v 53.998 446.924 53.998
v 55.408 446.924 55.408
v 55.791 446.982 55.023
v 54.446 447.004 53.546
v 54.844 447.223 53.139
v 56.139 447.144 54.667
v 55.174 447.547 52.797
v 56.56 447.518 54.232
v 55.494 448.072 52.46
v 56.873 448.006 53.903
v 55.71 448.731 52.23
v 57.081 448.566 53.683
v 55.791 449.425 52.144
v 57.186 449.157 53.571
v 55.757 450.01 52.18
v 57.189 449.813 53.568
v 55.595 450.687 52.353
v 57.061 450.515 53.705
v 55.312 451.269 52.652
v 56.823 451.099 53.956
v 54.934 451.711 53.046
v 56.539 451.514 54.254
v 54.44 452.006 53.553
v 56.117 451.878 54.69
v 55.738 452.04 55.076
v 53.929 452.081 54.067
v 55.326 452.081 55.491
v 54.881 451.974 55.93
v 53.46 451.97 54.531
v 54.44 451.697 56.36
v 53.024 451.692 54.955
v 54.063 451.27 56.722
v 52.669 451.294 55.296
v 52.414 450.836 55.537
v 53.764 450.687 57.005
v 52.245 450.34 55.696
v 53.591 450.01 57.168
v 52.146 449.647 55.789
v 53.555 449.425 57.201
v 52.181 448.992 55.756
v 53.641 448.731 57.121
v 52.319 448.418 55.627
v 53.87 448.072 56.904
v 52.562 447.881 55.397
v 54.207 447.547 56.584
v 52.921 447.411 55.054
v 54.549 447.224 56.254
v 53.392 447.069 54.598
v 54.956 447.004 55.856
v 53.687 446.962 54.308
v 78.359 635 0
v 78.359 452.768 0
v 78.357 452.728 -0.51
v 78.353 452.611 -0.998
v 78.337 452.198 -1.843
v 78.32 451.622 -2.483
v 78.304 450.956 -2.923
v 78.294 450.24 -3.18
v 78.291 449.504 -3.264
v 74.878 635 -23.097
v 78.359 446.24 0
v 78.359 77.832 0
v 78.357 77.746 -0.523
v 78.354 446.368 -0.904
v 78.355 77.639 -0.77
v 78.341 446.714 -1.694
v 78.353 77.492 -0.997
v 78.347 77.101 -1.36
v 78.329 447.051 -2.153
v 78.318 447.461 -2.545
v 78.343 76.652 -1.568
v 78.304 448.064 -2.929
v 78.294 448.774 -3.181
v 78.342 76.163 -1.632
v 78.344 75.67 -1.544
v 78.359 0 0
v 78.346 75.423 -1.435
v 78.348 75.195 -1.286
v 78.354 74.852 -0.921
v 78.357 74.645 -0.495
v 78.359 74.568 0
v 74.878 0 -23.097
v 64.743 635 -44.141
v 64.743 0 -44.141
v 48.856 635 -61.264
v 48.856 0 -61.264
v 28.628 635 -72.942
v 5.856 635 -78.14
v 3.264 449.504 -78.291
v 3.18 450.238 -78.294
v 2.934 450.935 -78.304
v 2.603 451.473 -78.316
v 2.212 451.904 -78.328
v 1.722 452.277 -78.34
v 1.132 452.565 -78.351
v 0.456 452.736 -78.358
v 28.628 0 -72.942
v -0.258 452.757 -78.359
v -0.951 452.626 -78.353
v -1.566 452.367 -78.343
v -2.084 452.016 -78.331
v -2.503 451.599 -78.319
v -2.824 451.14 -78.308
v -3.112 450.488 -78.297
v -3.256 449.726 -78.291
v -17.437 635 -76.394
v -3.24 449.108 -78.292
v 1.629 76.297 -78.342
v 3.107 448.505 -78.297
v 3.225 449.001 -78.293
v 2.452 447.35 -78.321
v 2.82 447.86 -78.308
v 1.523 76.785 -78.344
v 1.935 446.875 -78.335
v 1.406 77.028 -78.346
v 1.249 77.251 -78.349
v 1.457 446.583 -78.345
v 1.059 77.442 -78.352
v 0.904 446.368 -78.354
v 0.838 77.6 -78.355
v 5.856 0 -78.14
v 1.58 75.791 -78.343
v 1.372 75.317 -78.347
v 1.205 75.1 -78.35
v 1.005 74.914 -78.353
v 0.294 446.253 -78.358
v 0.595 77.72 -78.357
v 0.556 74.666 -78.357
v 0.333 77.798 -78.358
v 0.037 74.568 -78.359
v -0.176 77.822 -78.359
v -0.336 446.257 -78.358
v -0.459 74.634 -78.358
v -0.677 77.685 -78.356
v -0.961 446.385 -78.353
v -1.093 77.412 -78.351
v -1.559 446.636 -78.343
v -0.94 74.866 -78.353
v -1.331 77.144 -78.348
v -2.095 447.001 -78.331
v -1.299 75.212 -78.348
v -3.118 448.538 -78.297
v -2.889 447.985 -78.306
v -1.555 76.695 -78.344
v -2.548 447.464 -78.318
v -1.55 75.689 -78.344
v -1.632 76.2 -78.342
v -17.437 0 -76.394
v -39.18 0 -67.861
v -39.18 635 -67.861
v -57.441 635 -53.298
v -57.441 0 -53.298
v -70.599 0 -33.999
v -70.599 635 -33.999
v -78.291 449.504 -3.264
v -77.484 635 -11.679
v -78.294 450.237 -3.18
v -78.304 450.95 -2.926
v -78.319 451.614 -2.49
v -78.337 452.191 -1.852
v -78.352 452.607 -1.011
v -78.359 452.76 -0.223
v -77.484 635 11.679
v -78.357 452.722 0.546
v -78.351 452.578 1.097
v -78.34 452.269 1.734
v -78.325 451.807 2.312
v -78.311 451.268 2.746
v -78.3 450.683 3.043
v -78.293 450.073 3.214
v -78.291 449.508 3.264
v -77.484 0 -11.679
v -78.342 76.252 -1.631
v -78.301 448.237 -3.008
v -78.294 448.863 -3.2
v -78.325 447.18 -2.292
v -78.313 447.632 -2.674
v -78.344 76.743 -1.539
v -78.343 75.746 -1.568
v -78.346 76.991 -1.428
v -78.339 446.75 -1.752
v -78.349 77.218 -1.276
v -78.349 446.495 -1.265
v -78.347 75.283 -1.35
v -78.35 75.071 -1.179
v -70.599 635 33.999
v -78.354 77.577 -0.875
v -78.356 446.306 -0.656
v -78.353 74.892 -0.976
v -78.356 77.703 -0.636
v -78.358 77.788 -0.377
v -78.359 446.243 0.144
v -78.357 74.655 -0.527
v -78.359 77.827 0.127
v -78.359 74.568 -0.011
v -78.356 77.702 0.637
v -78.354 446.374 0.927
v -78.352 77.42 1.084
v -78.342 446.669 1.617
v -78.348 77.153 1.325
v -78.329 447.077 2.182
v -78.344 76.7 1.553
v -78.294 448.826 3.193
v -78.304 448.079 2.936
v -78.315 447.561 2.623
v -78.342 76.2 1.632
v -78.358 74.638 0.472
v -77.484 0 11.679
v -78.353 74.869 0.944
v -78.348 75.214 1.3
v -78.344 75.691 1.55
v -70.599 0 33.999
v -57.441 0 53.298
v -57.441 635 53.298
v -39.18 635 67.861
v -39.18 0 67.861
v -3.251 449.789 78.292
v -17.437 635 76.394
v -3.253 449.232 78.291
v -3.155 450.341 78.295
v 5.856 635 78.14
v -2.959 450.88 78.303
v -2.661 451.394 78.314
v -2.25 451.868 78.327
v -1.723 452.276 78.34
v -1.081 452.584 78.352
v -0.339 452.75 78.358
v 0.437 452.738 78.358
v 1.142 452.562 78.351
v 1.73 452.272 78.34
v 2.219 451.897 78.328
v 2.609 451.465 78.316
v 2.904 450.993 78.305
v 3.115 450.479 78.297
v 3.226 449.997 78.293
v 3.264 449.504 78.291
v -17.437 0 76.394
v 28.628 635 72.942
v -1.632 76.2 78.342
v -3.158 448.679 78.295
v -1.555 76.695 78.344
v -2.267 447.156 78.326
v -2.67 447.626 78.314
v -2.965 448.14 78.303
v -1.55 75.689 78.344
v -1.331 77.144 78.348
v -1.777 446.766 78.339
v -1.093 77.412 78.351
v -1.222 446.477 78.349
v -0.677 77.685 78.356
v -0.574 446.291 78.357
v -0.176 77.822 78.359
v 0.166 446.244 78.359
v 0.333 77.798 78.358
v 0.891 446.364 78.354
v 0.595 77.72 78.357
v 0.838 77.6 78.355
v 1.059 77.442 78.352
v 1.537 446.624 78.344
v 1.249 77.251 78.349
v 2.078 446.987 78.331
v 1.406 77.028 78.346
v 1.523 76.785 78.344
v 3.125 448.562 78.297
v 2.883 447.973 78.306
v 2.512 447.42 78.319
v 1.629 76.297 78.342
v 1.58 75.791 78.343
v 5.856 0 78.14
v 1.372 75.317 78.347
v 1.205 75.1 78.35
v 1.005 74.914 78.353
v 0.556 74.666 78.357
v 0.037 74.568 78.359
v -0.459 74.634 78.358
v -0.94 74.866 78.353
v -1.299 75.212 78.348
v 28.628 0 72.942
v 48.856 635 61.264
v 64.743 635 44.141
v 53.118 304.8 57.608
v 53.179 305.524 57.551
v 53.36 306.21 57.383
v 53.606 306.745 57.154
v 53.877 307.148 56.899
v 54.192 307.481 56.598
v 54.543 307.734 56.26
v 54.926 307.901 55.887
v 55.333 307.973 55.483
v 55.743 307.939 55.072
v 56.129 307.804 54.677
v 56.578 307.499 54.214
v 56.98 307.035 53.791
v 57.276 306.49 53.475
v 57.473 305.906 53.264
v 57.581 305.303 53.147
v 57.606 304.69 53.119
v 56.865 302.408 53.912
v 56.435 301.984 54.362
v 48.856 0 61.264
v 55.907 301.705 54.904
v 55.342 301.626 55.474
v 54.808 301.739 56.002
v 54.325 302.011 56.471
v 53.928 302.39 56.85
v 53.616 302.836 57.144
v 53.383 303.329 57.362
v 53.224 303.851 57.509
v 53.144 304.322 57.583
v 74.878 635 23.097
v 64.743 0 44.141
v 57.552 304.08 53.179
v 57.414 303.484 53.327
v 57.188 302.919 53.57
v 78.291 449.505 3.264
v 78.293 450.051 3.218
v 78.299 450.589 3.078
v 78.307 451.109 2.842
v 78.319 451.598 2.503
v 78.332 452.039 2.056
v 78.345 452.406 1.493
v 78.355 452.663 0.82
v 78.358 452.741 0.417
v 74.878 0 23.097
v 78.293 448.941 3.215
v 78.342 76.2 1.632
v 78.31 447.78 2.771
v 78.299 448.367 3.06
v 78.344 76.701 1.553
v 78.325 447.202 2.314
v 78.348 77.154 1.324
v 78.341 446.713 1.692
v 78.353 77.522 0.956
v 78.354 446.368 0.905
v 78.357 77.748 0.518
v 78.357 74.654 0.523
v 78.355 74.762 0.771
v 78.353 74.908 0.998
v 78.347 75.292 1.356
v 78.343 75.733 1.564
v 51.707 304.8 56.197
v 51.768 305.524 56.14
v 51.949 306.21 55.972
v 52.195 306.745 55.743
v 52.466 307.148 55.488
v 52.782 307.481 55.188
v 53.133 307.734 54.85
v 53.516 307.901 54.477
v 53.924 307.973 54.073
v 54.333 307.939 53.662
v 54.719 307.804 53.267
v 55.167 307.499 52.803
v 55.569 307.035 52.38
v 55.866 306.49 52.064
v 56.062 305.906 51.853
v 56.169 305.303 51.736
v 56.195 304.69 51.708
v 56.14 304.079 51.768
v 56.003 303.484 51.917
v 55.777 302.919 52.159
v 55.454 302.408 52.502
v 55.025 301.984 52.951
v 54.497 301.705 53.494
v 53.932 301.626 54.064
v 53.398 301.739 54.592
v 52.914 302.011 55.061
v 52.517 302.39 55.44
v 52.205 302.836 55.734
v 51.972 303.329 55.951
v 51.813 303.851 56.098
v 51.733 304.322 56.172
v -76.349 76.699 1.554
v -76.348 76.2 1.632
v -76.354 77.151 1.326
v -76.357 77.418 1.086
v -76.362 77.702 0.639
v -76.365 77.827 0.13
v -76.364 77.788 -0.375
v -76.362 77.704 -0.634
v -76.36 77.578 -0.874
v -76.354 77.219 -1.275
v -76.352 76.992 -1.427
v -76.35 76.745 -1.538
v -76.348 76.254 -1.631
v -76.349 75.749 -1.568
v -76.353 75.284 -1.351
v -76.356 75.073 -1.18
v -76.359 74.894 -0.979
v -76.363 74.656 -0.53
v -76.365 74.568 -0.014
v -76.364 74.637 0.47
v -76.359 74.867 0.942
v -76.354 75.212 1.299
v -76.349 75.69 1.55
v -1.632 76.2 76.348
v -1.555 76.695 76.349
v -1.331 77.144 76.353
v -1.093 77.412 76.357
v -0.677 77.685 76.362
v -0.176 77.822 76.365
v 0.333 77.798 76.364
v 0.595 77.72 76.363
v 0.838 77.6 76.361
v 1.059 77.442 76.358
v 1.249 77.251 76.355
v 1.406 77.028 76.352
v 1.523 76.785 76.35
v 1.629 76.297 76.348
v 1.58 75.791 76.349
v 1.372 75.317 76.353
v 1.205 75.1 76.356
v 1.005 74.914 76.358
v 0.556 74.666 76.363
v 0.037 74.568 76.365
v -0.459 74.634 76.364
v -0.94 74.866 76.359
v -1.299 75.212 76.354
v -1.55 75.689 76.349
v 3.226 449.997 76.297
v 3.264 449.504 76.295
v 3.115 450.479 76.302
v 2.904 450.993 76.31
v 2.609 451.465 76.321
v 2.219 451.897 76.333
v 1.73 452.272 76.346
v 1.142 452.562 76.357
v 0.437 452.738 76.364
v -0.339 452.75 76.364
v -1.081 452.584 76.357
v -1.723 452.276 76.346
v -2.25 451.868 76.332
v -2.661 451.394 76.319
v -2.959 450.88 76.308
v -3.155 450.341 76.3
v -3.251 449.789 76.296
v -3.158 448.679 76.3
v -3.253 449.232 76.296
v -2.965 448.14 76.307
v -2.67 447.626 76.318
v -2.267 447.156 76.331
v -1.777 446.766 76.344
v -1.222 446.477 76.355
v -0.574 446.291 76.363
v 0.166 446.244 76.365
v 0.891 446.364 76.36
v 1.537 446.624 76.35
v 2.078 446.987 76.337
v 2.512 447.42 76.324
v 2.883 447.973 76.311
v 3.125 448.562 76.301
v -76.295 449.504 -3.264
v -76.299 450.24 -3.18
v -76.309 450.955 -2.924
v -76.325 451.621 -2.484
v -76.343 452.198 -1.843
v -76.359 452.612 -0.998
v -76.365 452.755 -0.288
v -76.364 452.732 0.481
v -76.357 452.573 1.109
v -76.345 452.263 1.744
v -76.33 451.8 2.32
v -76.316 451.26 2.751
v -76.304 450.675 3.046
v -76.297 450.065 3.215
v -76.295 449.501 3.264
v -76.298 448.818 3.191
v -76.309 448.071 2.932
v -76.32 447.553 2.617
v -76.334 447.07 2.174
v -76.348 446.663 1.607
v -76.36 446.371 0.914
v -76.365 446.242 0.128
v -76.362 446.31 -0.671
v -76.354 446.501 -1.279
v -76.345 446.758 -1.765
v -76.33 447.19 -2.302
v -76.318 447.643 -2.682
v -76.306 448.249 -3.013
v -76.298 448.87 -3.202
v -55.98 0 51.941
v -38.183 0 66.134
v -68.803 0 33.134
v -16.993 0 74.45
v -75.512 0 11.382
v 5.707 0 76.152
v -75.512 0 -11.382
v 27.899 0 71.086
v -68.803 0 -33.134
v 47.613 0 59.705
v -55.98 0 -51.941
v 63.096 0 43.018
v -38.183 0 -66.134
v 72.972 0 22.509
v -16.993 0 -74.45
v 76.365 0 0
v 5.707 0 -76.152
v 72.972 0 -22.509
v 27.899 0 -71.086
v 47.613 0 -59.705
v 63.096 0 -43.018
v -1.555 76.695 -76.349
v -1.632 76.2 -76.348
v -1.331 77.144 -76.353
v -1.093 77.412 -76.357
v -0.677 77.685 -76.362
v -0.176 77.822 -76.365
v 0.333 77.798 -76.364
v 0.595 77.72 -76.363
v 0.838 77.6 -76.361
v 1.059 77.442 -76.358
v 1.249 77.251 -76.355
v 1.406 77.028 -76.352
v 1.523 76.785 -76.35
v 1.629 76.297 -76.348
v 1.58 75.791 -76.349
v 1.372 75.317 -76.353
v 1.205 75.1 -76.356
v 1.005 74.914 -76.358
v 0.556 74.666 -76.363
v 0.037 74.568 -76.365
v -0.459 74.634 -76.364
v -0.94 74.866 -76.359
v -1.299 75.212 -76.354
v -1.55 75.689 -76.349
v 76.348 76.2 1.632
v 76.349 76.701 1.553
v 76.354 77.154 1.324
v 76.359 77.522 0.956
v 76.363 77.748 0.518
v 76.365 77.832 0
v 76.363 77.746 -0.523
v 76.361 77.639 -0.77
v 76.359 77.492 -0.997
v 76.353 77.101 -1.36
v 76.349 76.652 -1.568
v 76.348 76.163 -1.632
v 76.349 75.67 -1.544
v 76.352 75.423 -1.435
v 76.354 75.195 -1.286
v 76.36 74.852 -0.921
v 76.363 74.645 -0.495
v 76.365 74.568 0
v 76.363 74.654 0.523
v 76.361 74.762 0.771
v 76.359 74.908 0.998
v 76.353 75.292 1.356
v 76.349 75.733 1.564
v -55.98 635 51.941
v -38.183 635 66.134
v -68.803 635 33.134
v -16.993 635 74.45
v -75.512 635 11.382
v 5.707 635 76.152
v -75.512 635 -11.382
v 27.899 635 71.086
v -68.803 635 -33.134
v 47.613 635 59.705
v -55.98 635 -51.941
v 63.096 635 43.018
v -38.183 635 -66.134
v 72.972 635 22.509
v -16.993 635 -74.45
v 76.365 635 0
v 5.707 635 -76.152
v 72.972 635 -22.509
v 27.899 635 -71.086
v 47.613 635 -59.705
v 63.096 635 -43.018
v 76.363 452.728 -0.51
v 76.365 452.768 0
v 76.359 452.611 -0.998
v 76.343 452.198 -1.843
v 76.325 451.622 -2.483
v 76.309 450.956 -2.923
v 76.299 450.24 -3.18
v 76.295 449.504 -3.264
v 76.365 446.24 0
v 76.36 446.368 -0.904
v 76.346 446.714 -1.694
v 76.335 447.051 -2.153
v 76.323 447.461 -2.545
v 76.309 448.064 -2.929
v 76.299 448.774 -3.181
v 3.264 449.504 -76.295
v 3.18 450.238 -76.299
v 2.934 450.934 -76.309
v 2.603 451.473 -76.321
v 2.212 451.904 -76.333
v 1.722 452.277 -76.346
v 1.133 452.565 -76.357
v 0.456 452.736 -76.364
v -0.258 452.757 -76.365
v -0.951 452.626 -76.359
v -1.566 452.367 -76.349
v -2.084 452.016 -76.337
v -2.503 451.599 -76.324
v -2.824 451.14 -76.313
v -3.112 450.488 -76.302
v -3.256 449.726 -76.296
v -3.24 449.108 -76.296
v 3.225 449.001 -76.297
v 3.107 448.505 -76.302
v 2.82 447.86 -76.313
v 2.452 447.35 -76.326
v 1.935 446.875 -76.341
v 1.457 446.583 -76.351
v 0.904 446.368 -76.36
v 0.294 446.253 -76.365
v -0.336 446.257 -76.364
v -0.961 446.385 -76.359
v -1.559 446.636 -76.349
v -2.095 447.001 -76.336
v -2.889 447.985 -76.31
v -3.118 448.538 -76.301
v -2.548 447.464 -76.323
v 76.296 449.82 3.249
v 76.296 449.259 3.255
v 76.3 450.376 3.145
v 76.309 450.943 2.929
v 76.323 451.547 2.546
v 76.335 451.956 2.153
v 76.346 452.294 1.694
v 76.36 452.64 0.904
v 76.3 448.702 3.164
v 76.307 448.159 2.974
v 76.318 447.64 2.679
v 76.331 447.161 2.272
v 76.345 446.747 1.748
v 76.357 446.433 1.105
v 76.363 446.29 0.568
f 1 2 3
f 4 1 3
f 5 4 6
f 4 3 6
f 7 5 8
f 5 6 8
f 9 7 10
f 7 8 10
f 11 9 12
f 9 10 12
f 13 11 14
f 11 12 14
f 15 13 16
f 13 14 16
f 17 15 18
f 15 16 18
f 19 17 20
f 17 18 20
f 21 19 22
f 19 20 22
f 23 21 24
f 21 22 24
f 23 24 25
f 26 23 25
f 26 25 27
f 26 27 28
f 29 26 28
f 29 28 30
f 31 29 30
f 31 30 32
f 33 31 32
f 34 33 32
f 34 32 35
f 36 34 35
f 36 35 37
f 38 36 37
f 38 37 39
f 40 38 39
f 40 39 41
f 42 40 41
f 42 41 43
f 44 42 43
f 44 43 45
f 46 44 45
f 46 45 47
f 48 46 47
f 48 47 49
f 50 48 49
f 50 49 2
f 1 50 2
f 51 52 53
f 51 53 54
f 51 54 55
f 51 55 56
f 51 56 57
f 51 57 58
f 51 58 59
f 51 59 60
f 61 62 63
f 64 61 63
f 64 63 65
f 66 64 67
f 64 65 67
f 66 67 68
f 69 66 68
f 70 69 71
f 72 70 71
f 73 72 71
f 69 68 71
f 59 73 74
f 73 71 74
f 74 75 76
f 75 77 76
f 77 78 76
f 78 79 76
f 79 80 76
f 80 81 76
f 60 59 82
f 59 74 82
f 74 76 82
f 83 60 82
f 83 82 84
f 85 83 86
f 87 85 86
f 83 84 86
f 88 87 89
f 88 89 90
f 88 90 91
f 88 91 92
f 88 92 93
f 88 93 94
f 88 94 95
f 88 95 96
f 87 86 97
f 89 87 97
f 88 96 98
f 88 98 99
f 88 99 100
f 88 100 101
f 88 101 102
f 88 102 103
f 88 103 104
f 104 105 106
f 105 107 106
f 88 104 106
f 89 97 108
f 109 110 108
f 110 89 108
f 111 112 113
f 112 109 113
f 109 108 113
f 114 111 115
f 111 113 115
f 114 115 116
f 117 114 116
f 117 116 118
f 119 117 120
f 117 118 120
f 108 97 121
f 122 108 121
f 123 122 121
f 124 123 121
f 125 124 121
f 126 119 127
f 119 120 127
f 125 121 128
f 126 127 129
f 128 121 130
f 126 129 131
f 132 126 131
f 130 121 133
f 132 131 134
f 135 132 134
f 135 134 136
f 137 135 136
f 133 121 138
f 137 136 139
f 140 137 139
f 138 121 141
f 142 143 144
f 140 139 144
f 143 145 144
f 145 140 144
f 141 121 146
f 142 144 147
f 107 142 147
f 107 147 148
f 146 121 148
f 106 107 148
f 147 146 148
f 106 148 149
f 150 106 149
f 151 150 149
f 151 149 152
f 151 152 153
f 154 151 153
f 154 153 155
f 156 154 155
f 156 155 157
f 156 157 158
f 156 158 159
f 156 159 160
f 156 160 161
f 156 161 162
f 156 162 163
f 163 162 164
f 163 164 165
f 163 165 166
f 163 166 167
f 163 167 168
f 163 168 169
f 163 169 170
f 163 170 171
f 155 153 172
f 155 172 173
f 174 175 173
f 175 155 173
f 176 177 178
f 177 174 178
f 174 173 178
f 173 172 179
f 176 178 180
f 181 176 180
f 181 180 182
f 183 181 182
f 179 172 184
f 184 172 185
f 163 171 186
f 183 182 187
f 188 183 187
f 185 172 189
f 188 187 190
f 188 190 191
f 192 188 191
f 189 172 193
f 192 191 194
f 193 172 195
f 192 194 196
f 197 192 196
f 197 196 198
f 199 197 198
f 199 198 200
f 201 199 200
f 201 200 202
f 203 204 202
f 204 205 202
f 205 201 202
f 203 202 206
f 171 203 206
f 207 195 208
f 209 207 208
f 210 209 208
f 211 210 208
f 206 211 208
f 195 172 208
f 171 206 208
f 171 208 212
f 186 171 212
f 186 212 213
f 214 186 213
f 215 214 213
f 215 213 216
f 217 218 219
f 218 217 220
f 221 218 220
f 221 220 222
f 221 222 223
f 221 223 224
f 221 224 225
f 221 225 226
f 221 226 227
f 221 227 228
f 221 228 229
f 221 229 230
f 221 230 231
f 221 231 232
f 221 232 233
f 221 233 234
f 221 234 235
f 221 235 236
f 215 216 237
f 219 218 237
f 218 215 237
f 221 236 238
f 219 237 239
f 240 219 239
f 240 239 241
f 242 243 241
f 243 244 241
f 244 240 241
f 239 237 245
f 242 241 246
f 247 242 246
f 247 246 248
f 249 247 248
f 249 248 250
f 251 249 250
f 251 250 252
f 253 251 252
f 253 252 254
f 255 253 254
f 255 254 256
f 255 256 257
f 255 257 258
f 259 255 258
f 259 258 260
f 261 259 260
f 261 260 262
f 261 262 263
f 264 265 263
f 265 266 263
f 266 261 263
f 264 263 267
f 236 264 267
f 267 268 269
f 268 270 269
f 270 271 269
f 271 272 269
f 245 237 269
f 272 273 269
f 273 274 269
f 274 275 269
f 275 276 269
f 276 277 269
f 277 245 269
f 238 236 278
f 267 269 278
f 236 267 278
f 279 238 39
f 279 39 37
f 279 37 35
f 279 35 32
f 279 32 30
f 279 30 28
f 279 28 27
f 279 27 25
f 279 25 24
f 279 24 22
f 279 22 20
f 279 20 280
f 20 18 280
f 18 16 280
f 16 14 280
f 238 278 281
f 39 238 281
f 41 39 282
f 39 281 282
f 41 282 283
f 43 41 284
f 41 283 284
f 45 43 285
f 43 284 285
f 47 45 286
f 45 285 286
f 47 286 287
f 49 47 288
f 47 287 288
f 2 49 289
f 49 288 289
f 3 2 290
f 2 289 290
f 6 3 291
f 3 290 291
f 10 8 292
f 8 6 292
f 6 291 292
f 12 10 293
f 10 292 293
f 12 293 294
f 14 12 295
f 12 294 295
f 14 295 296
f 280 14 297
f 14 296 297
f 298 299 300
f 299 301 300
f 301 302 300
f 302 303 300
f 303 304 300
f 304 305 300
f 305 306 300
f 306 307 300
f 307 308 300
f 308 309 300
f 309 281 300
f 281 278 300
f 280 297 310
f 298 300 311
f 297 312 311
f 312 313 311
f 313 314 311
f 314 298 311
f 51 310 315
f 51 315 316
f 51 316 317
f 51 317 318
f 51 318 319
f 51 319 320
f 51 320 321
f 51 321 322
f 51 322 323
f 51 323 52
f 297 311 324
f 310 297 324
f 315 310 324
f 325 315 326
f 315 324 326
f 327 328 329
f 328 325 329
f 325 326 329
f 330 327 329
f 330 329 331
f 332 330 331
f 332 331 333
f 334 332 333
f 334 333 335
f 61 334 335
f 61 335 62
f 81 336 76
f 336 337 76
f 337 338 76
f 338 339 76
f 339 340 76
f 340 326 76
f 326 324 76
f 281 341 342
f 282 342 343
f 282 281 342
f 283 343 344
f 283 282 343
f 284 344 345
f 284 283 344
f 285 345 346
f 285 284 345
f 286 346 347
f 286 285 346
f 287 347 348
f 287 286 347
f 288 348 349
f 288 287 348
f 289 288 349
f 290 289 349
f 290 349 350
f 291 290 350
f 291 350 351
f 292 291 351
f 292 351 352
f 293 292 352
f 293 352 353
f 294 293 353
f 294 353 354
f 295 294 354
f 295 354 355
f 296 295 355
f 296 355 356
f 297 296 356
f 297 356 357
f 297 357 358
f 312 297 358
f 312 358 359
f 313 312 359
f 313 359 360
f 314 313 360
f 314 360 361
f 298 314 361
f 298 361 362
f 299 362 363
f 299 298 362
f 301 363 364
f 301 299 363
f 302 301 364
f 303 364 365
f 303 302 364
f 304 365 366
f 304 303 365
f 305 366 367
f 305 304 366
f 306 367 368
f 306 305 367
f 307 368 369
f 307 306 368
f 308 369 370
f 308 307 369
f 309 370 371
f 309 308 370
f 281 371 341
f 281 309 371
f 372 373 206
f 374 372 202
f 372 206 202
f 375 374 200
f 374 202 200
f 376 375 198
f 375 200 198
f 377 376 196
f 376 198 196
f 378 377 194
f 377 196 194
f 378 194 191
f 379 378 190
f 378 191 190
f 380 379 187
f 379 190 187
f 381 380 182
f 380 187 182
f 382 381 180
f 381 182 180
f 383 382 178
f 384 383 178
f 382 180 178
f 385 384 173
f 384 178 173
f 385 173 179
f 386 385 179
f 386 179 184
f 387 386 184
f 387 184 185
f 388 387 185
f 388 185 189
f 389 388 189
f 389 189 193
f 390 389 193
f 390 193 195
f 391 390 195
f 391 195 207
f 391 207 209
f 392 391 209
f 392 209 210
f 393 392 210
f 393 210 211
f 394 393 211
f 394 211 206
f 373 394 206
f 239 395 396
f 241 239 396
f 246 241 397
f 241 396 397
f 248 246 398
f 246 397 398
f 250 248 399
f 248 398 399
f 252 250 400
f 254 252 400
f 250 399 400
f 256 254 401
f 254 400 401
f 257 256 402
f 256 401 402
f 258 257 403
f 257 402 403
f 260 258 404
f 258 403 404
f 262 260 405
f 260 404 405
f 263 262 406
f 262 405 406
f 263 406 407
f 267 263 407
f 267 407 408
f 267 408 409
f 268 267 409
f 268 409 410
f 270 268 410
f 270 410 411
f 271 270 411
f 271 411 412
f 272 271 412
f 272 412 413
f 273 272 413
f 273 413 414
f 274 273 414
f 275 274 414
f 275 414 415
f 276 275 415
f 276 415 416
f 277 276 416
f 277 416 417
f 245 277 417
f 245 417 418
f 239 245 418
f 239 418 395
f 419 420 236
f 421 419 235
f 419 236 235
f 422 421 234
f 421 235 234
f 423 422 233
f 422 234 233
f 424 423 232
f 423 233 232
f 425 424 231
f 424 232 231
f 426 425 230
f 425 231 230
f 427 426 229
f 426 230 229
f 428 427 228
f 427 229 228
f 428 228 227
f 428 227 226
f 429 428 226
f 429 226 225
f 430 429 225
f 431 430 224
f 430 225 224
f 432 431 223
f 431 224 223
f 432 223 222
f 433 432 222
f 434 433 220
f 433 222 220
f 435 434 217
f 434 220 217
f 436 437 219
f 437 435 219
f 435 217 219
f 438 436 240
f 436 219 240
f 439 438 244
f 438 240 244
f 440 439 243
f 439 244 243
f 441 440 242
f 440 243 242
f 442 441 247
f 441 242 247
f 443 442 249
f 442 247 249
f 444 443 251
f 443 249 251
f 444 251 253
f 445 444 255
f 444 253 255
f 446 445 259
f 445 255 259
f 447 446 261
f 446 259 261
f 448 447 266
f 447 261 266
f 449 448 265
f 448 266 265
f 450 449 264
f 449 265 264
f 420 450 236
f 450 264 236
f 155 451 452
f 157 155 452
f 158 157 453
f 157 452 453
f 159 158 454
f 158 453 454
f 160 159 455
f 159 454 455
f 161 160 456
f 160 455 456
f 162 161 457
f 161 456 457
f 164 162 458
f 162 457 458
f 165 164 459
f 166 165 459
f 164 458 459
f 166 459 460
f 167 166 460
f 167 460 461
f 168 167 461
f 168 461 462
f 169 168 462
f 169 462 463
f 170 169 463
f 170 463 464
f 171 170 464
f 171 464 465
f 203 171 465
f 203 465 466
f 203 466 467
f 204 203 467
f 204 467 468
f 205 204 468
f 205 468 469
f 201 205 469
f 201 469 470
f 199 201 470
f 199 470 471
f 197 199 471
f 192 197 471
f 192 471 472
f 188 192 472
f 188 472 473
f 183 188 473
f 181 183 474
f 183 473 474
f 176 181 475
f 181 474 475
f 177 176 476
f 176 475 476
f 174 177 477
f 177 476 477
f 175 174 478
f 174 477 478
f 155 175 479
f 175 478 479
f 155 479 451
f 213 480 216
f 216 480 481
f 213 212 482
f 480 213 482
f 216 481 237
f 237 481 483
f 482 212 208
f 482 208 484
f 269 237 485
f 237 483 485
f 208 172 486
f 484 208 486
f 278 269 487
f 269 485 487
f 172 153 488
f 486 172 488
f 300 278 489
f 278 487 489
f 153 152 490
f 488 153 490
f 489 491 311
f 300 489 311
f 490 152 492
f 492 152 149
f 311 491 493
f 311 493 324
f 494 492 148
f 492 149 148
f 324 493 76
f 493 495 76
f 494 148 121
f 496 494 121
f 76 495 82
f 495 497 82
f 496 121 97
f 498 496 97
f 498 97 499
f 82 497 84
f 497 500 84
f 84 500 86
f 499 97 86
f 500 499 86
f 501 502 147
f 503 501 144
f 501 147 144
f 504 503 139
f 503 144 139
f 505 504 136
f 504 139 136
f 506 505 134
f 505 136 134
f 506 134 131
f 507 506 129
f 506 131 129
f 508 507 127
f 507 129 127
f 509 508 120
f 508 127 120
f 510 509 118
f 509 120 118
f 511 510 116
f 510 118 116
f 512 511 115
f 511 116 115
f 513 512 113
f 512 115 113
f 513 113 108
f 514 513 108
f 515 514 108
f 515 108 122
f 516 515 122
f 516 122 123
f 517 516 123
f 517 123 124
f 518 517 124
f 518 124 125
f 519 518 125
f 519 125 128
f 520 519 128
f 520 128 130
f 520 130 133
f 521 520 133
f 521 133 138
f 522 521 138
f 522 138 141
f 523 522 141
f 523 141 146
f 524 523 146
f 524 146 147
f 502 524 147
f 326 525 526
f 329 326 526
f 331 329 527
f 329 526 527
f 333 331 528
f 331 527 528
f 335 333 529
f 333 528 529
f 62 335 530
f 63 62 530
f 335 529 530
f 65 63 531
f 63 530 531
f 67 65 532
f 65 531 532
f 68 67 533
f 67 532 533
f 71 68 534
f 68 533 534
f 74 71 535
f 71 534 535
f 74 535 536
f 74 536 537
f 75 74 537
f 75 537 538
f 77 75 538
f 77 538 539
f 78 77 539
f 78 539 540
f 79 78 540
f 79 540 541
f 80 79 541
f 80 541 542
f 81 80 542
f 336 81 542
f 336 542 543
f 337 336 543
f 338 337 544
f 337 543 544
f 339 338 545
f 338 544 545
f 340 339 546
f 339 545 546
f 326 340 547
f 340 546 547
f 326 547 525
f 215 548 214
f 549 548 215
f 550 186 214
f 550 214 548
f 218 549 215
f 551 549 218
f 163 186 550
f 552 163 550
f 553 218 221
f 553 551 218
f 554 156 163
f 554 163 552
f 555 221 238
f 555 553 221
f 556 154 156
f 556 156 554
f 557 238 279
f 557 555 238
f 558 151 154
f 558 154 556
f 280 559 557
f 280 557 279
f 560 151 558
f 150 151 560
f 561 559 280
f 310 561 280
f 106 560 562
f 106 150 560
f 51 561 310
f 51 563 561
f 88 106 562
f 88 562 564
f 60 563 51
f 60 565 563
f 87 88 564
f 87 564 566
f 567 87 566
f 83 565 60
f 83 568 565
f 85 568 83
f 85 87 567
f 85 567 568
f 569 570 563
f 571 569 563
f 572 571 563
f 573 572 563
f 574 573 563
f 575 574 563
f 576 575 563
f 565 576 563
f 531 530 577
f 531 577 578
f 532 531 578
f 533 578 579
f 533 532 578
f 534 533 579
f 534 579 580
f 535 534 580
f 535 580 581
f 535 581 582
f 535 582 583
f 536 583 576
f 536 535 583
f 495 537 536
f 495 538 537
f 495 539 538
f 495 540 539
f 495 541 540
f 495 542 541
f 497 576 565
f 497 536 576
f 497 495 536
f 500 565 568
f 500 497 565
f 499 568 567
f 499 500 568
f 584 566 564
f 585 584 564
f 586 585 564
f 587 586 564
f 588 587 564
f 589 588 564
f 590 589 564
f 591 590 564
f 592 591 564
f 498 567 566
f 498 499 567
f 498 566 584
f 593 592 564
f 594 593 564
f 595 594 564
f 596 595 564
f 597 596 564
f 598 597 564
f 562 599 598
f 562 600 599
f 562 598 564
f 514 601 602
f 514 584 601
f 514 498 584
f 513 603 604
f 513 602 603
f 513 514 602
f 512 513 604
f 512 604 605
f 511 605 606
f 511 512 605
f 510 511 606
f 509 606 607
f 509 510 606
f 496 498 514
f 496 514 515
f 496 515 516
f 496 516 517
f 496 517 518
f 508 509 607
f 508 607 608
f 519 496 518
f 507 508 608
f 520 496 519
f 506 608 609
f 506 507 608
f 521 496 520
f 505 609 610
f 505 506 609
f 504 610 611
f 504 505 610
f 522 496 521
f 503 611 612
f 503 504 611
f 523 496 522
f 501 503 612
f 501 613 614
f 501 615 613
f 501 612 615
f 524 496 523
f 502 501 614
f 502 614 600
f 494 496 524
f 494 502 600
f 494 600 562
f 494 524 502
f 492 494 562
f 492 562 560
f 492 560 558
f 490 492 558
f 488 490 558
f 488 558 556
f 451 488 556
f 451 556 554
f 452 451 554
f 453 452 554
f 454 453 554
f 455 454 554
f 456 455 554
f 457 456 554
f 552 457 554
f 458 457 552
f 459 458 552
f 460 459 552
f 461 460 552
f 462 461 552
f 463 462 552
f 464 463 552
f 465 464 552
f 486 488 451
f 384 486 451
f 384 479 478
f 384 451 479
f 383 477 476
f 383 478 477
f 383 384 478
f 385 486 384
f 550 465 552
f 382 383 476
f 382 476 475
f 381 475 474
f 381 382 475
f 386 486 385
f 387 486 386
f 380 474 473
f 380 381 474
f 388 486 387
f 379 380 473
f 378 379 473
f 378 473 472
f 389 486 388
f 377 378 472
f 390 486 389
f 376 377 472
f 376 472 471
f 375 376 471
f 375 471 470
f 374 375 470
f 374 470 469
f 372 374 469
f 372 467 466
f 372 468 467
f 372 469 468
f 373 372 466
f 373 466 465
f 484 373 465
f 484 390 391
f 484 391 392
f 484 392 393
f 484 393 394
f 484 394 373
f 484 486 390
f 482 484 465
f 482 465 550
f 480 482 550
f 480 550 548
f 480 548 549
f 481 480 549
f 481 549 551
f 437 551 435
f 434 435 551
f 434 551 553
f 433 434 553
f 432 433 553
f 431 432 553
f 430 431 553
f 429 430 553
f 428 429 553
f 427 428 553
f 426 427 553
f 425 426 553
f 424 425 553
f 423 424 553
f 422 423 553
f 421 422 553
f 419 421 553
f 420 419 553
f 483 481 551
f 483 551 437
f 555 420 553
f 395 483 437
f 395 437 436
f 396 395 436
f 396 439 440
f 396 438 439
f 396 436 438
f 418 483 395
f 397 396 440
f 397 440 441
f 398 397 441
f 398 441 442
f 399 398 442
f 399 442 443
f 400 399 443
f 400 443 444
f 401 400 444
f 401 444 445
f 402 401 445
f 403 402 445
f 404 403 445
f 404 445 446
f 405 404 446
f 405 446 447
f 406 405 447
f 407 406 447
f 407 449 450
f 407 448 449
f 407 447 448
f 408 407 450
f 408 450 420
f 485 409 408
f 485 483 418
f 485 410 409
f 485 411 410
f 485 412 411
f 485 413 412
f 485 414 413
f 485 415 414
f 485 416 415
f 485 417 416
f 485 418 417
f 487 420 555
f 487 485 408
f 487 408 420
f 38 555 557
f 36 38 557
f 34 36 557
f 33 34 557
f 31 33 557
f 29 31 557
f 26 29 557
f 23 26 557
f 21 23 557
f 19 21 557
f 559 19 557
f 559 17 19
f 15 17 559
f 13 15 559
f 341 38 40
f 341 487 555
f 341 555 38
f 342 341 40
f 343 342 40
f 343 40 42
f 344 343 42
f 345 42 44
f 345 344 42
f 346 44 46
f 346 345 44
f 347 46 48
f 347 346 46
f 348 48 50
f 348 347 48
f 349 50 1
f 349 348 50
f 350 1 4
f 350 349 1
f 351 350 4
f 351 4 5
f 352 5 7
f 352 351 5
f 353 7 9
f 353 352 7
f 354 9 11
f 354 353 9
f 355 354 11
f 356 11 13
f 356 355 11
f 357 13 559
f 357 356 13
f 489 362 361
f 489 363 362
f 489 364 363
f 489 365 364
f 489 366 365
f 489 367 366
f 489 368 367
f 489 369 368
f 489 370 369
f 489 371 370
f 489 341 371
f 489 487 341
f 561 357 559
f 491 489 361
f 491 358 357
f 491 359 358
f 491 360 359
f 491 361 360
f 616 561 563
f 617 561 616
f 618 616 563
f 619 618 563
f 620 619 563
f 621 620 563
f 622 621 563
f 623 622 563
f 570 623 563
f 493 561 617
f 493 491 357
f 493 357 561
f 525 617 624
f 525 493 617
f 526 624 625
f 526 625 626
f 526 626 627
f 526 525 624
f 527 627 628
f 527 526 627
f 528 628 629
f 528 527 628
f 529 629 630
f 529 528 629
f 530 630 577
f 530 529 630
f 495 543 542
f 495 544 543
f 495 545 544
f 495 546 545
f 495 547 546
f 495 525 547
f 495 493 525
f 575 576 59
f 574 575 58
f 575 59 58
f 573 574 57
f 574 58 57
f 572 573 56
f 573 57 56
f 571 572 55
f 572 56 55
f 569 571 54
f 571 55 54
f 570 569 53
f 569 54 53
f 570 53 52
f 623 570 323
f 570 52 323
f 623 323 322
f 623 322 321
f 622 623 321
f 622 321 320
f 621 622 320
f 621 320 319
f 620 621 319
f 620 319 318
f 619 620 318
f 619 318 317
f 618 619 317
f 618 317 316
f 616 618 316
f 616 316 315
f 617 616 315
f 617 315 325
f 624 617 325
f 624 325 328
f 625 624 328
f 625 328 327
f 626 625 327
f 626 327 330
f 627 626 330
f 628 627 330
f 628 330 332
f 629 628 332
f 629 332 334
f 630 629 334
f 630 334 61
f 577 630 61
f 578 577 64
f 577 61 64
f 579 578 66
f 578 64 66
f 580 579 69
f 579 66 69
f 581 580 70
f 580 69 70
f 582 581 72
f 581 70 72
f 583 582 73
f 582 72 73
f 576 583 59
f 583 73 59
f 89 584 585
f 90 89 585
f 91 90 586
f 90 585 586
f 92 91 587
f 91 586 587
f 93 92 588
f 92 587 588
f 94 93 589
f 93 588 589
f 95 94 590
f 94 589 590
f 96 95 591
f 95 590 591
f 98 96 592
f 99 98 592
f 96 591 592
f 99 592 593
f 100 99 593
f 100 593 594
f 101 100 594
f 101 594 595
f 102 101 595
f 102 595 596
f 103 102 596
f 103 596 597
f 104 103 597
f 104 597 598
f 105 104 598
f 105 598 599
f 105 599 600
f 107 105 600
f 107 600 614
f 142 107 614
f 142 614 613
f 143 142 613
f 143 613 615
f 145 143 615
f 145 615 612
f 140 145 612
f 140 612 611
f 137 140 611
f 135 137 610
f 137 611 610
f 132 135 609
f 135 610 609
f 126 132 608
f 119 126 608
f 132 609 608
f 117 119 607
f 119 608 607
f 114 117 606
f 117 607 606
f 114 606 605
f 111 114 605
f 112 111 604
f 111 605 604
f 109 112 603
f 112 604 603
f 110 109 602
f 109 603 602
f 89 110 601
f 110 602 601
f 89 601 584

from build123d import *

# Parameters (mm, degrees)
SKETCH2_R                      = 78.359
SKETCH2_R_2                    = 76.3651
BOSS_EXTRUDE1_DEPTH            = 635
SKETCH4_R                      = 3.2639
CUT_EXTRUDE2_DEPTH             = 79.359
CIRPATTERN2_COUNT              = 4
CUT_EXTRUDE3_REACH             = 191.175
SKETCH5_R                      = 2.57937
CUT_EXTRUDE3_DIRECTION_2_DEPTH = 33.457360675
VENT_HOLE_REACH                = 191.175
SKETCH6_R                      = 3.175
F_4_CLEARANCE_HOLE1_D          = 3.2639
CIRPATTERN3_COUNT              = 2
CIRPATTERN3_ANGLE              = 90


with BuildPart() as part:
    # Sketch2 → Boss-Extrude1 (new body)
    with BuildSketch(Plane(origin=(0, 0, 0), x_dir=(1, 0, 0), z_dir=(0, 1, 0))):
        Circle(SKETCH2_R)
        Circle(SKETCH2_R_2, mode=Mode.SUBTRACT)
    extrude(amount=BOSS_EXTRUDE1_DEPTH)

    # Sketch4 → Cut-Extrude2 (cut, symmetric)
    with BuildSketch(Plane.XY):
        with Locations((0, 449.5038)):
            Circle(SKETCH4_R)
    cut_extrude2 = extrude(amount=CUT_EXTRUDE2_DEPTH, both=True, mode=Mode.SUBTRACT)

    # CirPattern2: Cut-Extrude2 ×4 about axis
    cirpattern2_axis = Axis((0, 635, 0), (0, 1, 0))
    for i in range(1, CIRPATTERN2_COUNT):
        add(cut_extrude2.rotate(cirpattern2_axis, i * 360 / CIRPATTERN2_COUNT), mode=Mode.SUBTRACT)

    # Sketch5 → Cut-Extrude3 (cut, up to next)
    with BuildSketch(Plane(origin=(55.408180267, 0, 55.408180267), x_dir=(0, -1, 0), z_dir=(0.707106781, 0, 0.707106781)), mode=Mode.PRIVATE) as cut_extrude3_sk1:
        with Locations((-449.5038, 0)):
            Circle(SKETCH5_R)
    cut_extrude3_tool1 = extrude(cut_extrude3_sk1.sketch, amount=-CUT_EXTRUDE3_REACH, mode=Mode.PRIVATE) & part.part
    add(cut_extrude3_tool1.solids().sort_by_distance((55.40818, 449.5038, 55.40818))[0], mode=Mode.SUBTRACT)

    # Sketch5 → Cut-Extrude3 direction 2 (cut)
    with BuildSketch(Plane(origin=(55.408180267, 0, 55.408180267), x_dir=(0, -1, 0), z_dir=(0.707106781, 0, 0.707106781))):
        with Locations((-449.5038, 0)):
            Circle(SKETCH5_R)
    extrude(amount=CUT_EXTRUDE3_DIRECTION_2_DEPTH, mode=Mode.SUBTRACT)

    # Sketch6 → Vent Hole (cut, up to next)
    with BuildSketch(Plane(origin=(189.175360534, 0, -78.359), x_dir=(-0.707106781, 0, 0.707106781), z_dir=(-0.707106781, 0, -0.707106781)), mode=Mode.PRIVATE) as vent_hole_sk1:
        with Locations((189.175360534, 304.8)):
            Circle(SKETCH6_R)
    vent_hole_tool1 = extrude(vent_hole_sk1.sketch, amount=VENT_HOLE_REACH, mode=Mode.PRIVATE) & part.part
    add(vent_hole_tool1.solids().sort_by_distance((55.40818, 304.8, 55.40818))[0], mode=Mode.SUBTRACT)

    # #4 Clearance Hole1 (through all)
    with Locations(Plane.XY.offset(78.359)):
        with Locations((0, 76.2)):
            f_4_clearance_hole1 = Hole(F_4_CLEARANCE_HOLE1_D / 2)

    # CirPattern3: #4 Clearance Hole1 ×2 about axis
    cirpattern3_axis = Axis((0, 0, 0), (0, 1, 0))
    for i in range(1, CIRPATTERN3_COUNT):
        add(f_4_clearance_hole1.rotate(cirpattern3_axis, i * CIRPATTERN3_ANGLE / (CIRPATTERN3_COUNT - 1)), mode=Mode.SUBTRACT)


solid = part.part
